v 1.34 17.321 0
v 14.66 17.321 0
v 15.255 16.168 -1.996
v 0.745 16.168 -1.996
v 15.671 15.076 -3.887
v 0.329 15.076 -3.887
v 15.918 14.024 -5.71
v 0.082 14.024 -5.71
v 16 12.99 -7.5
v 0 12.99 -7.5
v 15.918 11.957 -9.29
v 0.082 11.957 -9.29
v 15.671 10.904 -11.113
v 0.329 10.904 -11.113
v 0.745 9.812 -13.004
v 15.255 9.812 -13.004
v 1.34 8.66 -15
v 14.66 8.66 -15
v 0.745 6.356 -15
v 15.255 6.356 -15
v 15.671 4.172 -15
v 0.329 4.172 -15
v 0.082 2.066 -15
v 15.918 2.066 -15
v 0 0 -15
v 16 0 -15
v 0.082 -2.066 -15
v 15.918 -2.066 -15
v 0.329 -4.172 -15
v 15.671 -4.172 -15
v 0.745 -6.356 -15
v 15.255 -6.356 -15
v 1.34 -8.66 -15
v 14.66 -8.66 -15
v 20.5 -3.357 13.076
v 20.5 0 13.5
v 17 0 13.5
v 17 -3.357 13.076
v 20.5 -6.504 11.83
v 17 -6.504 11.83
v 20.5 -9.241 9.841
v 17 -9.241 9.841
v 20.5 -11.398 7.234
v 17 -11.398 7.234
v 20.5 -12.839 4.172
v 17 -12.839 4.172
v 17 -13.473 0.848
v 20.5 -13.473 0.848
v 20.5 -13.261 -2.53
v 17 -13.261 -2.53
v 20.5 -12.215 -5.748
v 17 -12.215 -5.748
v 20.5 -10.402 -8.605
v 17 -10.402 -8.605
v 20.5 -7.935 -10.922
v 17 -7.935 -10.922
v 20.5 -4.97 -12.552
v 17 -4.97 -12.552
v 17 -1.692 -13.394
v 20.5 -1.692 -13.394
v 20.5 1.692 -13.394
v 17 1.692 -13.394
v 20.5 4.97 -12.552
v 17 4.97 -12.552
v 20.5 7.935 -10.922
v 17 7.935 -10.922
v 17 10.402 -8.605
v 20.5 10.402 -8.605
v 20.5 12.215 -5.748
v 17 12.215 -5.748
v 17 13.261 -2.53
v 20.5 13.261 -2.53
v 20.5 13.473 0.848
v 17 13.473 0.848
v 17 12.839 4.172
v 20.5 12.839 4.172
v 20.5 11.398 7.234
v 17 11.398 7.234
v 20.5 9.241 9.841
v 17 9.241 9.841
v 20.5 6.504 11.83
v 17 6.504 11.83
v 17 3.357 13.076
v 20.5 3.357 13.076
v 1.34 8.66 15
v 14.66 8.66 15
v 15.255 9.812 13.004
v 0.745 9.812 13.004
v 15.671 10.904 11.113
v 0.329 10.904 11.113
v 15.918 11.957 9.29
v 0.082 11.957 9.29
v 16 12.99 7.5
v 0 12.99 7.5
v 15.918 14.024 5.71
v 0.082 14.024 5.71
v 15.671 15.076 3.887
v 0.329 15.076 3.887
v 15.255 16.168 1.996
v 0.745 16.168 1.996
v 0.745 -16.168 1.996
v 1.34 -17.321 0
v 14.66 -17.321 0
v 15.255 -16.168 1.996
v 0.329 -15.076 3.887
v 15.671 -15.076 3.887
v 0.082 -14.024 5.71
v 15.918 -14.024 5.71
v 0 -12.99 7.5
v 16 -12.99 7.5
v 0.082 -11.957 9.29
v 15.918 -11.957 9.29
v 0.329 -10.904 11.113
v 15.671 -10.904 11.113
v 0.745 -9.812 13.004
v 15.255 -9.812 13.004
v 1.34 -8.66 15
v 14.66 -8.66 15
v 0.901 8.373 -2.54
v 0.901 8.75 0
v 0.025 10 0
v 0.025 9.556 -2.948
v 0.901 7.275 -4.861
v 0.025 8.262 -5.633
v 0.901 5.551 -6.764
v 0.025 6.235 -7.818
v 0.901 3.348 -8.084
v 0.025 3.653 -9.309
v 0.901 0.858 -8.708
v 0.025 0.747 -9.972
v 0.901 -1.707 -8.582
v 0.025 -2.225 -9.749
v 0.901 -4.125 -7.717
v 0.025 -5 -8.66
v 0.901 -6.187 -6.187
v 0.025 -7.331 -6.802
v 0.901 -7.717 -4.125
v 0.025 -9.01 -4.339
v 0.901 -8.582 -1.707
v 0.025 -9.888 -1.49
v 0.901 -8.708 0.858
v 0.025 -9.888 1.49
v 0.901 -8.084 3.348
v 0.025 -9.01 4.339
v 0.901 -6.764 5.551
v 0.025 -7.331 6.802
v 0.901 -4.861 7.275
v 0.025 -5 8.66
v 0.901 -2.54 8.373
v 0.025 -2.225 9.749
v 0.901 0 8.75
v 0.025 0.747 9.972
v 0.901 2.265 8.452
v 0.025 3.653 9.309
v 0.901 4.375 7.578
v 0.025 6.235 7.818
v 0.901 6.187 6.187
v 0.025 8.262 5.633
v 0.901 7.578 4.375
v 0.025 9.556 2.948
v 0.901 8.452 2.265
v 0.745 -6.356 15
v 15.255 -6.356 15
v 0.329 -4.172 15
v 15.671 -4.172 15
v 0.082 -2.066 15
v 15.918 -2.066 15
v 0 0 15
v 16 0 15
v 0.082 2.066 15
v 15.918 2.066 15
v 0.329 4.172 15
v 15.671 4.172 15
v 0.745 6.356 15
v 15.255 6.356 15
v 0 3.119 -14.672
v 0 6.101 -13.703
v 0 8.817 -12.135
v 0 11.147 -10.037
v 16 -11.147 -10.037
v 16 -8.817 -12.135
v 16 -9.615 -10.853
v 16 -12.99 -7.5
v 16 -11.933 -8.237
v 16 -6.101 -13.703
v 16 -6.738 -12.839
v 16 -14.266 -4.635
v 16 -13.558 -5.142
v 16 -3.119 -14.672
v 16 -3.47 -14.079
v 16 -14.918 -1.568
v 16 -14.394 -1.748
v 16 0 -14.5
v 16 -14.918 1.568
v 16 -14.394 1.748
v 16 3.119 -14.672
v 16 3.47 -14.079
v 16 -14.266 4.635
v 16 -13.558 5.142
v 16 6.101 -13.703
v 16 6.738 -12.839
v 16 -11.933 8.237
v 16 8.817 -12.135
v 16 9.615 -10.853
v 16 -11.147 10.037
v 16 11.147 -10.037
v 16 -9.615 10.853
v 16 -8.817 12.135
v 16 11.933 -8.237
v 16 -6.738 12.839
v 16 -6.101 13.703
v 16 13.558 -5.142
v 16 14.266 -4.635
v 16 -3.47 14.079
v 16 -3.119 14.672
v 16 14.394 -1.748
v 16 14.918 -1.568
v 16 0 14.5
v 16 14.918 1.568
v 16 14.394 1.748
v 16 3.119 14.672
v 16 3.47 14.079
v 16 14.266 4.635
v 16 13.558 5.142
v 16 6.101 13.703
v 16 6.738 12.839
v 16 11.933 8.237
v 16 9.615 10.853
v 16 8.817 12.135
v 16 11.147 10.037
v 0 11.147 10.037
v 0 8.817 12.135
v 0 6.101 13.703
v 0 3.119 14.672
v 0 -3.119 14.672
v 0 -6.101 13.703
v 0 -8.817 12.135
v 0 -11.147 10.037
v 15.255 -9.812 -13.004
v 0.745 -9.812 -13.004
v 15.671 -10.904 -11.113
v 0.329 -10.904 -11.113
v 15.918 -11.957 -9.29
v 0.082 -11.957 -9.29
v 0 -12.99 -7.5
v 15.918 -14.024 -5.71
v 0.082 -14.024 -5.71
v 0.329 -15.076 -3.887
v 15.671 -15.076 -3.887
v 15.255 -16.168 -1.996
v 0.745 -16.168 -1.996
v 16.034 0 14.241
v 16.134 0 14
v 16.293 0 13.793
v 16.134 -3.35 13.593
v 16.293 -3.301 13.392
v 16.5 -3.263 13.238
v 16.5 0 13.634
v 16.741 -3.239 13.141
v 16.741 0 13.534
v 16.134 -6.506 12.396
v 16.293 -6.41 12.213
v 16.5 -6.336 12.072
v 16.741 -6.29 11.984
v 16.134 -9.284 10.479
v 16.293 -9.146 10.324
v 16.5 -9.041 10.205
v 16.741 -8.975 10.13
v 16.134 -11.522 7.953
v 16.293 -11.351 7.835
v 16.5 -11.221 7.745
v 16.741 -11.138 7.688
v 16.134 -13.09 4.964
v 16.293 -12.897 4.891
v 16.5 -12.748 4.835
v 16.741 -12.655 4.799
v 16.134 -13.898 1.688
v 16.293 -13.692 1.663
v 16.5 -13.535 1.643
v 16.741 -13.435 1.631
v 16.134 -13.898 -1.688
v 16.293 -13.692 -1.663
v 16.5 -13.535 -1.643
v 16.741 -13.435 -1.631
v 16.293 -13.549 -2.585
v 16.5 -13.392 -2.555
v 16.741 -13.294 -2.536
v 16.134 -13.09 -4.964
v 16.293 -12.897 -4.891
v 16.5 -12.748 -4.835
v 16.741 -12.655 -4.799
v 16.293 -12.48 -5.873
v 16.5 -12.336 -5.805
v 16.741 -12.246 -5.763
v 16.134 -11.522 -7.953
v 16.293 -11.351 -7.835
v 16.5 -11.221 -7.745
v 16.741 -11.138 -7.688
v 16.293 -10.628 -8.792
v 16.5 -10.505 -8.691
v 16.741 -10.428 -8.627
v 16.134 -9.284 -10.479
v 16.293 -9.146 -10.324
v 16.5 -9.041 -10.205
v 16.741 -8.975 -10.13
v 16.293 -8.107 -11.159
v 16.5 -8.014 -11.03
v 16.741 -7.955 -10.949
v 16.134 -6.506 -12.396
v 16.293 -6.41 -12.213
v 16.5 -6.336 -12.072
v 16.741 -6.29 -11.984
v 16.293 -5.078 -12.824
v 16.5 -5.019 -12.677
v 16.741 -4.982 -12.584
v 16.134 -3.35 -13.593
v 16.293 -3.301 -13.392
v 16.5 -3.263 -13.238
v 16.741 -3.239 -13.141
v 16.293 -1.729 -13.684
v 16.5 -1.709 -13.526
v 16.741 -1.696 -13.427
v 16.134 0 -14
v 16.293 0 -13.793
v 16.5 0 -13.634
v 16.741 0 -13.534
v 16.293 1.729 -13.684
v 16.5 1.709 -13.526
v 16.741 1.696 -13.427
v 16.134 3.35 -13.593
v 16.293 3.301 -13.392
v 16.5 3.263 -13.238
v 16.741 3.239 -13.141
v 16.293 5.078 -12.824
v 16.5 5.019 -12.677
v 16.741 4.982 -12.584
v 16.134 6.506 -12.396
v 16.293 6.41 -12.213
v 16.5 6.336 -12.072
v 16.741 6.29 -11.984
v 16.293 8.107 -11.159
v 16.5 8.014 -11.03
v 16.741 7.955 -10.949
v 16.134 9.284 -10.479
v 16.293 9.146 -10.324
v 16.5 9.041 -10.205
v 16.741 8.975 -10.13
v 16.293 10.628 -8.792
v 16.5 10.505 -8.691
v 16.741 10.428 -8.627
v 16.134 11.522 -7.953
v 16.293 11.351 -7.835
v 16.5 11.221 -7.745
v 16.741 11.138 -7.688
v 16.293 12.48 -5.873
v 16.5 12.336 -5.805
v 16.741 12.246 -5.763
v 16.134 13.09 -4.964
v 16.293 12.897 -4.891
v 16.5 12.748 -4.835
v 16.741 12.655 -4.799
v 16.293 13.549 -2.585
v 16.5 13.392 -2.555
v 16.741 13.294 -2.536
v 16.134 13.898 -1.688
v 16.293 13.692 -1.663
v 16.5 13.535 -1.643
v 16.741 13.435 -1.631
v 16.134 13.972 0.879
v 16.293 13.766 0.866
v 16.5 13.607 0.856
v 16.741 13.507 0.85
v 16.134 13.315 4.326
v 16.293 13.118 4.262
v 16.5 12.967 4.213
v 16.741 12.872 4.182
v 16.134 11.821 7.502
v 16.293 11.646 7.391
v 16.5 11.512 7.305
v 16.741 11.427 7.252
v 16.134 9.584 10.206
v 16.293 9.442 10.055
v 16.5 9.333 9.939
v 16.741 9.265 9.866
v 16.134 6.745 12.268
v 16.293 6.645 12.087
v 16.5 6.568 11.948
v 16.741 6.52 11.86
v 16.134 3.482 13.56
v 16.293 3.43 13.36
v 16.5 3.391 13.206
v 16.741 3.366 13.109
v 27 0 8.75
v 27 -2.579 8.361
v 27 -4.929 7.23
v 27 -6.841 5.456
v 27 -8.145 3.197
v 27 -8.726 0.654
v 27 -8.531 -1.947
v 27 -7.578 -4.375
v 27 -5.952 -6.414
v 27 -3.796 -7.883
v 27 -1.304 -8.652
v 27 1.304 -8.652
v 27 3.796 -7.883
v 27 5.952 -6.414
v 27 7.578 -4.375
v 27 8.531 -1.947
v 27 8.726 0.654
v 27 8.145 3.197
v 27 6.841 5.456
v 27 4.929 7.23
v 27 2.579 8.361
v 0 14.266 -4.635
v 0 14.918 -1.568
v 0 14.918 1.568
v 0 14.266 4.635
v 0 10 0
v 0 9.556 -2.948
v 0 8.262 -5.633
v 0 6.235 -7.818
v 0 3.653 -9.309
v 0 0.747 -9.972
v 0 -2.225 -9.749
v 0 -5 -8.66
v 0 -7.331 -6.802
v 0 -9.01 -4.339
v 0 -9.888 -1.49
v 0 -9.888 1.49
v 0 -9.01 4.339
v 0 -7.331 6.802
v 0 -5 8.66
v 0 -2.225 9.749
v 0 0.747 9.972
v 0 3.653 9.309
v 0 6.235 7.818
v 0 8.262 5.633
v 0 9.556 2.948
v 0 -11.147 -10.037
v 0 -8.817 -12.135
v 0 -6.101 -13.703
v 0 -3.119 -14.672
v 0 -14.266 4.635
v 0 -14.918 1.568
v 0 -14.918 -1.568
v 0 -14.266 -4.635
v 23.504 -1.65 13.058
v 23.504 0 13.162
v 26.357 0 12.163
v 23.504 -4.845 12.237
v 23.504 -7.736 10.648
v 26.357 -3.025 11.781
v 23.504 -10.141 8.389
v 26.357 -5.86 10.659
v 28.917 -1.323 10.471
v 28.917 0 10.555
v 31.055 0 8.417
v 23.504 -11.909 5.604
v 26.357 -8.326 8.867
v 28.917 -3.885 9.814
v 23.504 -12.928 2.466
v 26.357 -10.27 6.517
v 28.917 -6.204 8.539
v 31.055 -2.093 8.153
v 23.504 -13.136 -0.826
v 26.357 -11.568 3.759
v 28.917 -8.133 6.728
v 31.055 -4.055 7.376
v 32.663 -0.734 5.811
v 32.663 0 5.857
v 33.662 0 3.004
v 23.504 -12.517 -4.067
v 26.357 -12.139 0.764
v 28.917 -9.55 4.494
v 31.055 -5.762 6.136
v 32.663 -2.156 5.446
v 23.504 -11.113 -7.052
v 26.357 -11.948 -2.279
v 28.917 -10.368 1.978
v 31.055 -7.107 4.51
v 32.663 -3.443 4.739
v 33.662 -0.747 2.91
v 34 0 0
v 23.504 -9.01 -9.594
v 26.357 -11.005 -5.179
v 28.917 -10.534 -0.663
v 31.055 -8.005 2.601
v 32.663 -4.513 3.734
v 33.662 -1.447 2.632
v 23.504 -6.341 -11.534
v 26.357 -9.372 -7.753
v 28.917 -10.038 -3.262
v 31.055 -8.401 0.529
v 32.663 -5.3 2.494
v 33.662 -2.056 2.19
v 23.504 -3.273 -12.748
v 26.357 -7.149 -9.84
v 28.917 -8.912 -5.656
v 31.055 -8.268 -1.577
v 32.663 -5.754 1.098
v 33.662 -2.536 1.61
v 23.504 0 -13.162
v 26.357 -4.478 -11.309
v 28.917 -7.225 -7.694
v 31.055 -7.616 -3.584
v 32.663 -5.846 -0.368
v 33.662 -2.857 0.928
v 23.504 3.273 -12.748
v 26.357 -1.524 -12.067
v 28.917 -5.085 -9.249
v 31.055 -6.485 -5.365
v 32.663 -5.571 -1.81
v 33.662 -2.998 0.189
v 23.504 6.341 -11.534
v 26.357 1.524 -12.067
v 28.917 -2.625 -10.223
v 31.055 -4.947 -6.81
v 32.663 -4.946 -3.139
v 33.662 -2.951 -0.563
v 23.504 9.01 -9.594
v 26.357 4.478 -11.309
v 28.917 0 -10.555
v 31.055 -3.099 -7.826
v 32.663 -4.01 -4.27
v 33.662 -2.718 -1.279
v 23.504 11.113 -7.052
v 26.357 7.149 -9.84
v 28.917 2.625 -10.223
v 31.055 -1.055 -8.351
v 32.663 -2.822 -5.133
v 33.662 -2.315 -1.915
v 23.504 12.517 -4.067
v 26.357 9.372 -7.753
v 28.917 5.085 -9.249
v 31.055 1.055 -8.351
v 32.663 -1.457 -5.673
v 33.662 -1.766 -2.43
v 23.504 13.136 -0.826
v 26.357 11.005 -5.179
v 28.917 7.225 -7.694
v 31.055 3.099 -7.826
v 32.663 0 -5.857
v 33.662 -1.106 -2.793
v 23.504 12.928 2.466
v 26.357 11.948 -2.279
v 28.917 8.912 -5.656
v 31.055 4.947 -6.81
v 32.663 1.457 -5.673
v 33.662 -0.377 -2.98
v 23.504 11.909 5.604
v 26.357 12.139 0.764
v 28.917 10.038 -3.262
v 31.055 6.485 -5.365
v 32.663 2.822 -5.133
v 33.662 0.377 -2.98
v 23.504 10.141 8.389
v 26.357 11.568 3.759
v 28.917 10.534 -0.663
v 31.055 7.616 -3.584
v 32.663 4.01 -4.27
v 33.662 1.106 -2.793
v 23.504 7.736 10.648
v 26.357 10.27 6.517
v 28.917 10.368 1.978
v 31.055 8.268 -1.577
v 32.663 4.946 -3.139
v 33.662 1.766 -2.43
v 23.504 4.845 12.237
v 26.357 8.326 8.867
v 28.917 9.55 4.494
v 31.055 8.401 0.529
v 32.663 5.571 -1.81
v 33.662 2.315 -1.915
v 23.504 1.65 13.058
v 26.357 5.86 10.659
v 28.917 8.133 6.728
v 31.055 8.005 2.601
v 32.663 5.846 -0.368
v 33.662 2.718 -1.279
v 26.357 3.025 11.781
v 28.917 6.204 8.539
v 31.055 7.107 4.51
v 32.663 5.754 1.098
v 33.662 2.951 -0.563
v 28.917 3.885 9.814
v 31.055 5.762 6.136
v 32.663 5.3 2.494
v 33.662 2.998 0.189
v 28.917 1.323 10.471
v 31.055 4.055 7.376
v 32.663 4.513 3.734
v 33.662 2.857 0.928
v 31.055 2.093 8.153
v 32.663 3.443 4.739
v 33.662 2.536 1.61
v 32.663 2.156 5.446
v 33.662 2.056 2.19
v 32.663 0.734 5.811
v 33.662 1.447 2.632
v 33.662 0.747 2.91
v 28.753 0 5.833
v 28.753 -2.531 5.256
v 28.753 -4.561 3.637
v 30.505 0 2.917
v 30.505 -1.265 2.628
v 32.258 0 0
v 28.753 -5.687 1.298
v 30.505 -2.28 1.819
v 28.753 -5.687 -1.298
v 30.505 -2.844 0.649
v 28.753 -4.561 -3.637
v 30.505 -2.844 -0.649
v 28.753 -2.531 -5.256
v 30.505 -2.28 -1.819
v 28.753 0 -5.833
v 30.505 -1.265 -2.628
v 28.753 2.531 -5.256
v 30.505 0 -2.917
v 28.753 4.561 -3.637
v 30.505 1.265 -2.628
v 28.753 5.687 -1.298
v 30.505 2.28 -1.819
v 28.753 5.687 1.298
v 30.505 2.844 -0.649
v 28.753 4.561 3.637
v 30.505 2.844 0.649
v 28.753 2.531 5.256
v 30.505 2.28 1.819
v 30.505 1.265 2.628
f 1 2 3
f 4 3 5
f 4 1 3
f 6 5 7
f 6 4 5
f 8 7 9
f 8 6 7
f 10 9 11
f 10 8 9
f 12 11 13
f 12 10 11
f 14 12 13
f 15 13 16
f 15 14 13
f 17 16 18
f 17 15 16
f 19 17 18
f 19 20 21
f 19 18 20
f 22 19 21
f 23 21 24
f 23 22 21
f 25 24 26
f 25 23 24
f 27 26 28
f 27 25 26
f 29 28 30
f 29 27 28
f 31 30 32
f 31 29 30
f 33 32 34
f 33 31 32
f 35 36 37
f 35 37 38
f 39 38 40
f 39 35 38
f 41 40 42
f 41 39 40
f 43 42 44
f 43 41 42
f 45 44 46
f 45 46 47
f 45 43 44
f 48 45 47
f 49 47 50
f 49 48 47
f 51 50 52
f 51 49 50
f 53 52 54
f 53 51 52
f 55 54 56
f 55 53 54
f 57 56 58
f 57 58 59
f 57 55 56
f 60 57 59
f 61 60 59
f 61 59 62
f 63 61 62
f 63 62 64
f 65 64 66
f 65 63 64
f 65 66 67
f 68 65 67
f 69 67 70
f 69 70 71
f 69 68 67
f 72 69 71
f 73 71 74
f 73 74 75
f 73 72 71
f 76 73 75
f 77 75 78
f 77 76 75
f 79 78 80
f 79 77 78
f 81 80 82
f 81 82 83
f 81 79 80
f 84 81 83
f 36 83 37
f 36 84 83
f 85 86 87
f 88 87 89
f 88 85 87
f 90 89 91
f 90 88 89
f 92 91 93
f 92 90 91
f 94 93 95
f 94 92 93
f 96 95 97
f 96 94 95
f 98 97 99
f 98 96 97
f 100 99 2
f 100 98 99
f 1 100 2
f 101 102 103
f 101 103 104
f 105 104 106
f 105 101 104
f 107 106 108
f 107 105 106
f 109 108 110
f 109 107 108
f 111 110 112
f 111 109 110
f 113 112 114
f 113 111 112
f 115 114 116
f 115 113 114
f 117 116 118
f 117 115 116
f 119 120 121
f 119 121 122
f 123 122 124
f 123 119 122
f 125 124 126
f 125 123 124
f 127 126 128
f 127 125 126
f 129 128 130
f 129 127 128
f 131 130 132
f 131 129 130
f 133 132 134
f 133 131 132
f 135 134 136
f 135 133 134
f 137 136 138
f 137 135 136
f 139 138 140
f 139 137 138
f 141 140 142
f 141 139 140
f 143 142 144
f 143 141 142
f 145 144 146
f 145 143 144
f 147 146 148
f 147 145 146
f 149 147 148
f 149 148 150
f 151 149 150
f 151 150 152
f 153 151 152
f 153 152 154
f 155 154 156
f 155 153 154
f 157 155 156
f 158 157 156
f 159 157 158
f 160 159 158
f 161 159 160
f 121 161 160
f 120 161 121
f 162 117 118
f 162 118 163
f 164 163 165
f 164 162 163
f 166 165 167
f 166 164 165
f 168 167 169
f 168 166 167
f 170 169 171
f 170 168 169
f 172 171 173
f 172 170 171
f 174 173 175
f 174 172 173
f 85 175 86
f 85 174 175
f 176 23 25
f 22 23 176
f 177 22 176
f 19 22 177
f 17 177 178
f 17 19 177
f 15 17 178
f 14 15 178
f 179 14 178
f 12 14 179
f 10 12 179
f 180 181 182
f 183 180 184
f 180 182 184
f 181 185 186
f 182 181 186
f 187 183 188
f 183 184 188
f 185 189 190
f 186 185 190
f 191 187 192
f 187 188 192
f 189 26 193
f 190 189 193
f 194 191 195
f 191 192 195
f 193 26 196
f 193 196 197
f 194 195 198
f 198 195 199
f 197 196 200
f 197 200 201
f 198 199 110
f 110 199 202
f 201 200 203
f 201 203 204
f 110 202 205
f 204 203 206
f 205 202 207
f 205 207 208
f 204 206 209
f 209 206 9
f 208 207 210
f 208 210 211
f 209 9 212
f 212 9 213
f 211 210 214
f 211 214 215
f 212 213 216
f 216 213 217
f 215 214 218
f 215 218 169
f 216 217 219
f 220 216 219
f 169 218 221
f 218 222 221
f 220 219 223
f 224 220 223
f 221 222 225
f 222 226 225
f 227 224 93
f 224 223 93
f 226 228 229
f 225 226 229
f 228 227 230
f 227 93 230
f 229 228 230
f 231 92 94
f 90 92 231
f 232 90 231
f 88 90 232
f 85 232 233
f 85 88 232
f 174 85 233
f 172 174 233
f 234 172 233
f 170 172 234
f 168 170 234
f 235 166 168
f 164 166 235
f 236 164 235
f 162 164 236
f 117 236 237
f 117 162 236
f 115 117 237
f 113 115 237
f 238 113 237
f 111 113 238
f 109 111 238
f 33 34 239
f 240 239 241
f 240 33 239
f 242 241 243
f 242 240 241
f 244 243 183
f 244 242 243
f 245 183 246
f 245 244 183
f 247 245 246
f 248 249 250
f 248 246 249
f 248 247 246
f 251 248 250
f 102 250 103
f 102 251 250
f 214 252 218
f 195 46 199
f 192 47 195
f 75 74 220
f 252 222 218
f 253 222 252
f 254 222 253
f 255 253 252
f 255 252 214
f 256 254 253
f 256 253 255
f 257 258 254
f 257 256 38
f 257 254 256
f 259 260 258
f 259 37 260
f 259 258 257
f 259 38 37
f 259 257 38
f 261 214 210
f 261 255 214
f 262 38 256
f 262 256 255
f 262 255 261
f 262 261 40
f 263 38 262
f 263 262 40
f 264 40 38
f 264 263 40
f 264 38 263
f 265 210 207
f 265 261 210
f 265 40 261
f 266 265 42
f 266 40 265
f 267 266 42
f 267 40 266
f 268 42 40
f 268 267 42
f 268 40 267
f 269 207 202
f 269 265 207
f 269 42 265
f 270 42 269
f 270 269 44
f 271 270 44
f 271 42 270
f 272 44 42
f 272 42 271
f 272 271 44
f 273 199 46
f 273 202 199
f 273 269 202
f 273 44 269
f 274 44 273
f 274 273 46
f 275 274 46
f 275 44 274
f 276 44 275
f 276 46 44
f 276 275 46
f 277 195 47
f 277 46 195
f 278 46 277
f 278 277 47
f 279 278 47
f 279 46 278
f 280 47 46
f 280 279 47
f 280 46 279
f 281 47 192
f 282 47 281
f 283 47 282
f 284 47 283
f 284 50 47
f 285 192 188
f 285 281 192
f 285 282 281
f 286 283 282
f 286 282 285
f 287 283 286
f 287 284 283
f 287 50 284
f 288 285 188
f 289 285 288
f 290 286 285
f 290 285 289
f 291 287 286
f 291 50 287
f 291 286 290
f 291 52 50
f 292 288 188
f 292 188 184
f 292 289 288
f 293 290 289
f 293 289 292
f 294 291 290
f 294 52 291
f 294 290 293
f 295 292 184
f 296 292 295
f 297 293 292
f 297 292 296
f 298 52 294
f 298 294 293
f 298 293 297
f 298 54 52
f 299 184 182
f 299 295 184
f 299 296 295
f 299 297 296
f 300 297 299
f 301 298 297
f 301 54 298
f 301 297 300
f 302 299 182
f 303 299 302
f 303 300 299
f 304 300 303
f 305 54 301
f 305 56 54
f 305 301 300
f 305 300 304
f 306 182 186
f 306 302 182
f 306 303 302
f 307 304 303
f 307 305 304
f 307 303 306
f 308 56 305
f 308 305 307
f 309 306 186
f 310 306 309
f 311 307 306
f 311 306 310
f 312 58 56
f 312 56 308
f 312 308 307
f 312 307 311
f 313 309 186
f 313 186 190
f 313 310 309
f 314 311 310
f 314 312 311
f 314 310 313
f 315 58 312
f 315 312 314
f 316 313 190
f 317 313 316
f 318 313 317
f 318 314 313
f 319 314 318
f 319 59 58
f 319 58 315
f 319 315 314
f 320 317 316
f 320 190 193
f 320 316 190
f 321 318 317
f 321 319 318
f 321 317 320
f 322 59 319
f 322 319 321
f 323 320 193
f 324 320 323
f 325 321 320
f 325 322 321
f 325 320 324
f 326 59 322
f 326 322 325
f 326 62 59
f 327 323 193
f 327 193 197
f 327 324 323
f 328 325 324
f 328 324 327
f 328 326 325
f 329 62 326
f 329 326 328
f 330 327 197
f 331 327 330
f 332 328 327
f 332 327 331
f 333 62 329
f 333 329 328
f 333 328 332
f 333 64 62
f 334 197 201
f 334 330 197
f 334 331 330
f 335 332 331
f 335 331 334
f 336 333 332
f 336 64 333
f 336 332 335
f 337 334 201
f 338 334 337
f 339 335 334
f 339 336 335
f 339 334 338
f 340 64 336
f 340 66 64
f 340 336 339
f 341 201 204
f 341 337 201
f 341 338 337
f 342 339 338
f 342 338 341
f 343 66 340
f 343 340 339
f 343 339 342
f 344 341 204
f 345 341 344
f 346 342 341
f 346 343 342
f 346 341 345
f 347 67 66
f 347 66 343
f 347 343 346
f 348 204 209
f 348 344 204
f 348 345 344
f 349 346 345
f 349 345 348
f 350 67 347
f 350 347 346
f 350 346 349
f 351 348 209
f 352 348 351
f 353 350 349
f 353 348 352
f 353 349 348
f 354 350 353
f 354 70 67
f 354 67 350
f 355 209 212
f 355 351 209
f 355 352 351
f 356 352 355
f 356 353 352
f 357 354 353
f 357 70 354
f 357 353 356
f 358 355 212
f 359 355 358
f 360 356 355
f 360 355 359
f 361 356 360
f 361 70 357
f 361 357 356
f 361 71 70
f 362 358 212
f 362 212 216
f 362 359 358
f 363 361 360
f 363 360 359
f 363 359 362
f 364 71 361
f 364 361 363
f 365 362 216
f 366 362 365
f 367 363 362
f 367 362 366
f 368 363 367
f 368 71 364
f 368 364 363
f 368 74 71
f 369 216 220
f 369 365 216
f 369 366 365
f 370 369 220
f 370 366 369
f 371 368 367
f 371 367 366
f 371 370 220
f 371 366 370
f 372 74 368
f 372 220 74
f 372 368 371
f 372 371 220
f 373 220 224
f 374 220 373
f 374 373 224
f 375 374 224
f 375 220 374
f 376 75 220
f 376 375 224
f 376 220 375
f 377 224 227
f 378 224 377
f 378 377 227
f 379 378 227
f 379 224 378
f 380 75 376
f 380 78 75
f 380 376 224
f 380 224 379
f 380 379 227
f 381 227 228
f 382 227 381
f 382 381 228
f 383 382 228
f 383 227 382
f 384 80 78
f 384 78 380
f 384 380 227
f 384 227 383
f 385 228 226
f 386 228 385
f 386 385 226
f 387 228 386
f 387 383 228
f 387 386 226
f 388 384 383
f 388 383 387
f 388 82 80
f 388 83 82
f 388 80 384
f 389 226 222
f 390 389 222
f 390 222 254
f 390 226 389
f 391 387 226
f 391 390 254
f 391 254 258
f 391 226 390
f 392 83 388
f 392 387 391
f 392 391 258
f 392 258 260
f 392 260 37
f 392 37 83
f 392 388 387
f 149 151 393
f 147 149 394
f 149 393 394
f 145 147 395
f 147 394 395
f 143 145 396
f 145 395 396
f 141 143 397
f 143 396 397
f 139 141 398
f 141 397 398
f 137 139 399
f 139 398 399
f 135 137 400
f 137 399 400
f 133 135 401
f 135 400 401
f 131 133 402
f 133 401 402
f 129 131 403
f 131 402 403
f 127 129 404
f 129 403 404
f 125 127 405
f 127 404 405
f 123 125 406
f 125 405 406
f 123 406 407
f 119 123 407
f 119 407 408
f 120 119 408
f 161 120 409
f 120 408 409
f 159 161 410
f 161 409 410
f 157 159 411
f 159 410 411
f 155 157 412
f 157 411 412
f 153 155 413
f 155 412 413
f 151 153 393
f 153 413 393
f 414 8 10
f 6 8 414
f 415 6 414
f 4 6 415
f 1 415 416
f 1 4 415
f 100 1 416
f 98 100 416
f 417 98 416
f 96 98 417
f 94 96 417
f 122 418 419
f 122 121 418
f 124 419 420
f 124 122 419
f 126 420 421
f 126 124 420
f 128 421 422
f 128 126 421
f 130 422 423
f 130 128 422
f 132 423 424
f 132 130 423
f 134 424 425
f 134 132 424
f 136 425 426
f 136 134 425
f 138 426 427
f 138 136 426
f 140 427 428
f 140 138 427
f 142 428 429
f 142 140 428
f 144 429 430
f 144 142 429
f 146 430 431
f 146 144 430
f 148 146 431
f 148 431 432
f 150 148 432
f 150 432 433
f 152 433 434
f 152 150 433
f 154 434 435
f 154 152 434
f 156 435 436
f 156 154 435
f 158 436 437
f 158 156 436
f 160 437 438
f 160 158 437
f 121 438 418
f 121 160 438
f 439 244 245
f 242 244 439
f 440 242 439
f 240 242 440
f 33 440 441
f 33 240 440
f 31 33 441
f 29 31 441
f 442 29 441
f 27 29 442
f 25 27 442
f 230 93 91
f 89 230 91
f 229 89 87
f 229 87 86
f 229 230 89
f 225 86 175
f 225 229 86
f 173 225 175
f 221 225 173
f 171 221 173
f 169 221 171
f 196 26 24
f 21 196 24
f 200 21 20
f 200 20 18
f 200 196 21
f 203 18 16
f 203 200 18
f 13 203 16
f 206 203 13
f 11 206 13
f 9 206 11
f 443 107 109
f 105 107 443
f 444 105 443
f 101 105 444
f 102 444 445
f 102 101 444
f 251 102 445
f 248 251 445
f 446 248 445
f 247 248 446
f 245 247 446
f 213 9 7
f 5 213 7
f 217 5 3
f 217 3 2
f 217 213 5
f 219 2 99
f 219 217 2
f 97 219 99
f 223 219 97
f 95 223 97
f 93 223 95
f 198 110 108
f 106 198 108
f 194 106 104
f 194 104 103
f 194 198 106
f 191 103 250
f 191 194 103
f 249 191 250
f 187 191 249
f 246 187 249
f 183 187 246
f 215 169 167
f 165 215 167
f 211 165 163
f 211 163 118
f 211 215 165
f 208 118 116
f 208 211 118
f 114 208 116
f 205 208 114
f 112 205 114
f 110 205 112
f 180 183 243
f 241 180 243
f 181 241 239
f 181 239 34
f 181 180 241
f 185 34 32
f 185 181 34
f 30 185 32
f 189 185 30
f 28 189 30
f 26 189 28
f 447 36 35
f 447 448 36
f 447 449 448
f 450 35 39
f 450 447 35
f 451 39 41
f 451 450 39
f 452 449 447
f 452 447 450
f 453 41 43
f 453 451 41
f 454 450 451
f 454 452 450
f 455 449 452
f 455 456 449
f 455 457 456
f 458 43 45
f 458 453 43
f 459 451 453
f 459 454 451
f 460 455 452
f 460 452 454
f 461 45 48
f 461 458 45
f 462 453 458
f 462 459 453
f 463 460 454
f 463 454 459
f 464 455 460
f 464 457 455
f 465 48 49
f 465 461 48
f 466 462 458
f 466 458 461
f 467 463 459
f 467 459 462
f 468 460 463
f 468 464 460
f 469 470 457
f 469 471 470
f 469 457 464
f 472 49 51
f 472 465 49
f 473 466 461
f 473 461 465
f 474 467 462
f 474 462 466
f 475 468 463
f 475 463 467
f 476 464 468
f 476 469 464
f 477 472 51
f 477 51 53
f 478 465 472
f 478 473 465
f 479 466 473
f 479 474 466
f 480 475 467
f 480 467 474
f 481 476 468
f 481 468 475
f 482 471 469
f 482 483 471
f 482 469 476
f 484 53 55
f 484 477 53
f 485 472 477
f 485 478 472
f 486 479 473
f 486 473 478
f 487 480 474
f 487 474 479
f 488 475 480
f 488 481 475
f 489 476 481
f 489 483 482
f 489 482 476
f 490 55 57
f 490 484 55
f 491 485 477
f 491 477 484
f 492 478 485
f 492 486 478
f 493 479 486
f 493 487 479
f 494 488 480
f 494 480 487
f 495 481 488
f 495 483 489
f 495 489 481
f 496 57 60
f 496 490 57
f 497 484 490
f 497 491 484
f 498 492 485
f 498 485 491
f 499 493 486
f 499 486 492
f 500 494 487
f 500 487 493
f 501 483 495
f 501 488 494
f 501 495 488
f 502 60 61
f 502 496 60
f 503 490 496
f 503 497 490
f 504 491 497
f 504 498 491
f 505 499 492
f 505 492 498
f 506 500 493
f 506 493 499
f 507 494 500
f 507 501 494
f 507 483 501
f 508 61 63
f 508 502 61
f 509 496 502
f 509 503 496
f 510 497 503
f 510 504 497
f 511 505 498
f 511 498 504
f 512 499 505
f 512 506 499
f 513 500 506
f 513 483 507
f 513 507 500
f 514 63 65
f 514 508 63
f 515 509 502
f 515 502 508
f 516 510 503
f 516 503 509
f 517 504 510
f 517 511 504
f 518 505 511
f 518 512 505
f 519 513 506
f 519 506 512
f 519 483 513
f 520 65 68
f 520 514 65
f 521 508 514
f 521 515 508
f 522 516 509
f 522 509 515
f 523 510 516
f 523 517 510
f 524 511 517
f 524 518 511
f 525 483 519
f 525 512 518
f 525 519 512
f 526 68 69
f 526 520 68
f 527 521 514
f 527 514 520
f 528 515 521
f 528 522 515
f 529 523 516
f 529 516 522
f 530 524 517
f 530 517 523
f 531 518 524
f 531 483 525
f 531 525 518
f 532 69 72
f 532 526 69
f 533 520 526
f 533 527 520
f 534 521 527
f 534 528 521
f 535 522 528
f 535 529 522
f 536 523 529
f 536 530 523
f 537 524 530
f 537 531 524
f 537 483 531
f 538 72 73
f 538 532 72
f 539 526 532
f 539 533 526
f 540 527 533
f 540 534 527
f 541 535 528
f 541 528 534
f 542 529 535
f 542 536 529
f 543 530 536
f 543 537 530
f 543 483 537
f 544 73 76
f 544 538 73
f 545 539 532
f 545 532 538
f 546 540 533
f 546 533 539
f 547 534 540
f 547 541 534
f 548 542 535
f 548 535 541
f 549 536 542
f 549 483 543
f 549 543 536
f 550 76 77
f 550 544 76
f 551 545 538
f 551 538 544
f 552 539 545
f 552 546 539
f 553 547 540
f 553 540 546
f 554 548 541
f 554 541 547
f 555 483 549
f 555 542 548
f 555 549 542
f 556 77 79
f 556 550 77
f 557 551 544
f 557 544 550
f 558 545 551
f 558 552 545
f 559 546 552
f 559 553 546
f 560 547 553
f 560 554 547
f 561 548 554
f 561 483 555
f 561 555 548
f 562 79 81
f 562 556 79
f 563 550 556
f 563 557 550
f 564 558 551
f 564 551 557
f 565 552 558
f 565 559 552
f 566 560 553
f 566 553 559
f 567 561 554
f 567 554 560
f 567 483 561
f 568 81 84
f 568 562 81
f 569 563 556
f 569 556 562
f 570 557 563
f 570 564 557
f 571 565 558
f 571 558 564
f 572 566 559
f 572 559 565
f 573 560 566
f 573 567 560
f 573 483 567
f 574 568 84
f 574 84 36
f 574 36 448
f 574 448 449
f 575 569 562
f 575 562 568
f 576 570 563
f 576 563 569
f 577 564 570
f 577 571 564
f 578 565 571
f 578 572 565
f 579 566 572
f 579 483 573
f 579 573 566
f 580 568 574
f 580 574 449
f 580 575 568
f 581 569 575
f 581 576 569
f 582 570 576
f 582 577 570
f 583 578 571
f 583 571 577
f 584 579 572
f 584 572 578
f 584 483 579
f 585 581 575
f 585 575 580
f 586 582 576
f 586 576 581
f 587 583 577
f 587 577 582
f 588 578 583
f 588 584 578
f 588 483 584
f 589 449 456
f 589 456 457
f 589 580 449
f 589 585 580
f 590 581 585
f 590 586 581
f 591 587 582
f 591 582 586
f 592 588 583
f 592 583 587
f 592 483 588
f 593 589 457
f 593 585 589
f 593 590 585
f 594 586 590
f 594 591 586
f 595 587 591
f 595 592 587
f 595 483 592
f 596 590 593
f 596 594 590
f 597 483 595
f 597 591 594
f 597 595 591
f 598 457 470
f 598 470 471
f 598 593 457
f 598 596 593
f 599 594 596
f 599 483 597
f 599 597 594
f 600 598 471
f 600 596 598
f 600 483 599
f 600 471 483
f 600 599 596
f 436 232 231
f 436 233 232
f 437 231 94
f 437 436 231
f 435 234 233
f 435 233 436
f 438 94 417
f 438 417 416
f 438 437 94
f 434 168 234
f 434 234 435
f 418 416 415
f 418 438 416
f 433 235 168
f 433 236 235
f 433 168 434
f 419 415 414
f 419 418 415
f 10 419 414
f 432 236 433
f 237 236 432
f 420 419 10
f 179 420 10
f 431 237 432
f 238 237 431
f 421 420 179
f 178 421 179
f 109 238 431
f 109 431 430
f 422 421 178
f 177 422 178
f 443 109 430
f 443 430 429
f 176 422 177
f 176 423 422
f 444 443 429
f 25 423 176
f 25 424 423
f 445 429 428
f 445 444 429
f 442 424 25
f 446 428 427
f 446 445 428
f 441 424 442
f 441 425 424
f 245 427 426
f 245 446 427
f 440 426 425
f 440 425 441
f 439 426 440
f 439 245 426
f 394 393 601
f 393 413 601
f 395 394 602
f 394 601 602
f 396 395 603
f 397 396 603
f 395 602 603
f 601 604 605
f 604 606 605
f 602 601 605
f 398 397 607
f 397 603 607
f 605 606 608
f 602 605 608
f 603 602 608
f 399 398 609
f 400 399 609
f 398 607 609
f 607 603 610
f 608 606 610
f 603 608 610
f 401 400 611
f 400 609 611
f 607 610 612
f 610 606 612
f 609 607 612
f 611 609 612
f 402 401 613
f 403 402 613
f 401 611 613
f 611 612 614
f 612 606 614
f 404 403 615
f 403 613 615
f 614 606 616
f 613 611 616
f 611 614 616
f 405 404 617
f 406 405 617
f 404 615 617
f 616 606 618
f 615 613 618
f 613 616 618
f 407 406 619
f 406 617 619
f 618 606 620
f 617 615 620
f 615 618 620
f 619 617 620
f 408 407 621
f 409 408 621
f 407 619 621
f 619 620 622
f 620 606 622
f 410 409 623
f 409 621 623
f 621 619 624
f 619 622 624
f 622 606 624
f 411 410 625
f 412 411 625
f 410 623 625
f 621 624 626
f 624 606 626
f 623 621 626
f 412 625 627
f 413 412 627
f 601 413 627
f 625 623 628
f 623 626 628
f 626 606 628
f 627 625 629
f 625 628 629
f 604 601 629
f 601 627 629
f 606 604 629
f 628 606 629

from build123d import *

# Parameters (mm, degrees)
BASENUT_DEPTH = 16
DOMEFILLET_R  = 1


with BuildPart() as part:
    # BaseNutSke → BaseNut (new body)
    with BuildSketch(Plane(origin=(0, 0, 0), x_dir=(0, 0, -1), z_dir=(1, 0, 0))):
        Polygon((15, 8.660254038), (15, -8.660254038), (0, -17.320508076), (-15, -8.660254038), (-15, 8.660254038), (0, 17.320508076), align=None)
    extrude(amount=BASENUT_DEPTH)

    # DomeSke → Dome (revolve)
    with BuildSketch(Plane.XY, mode=Mode.PRIVATE) as dome_sk:
        with BuildLine():
            Line((34, 0), (0, 0))
            Line((0, 0), (0, 13.5))
            Line((0, 13.5), (20.5, 13.5))
            ThreePointArc((20.5, 13.5), (30.045941546, 9.545941546), (34, 0))
        make_face()
    revolve(dome_sk.sketch.rotate(Axis((0, 0, 0), (1, 0, 0)), 90), axis=Axis((0, 0, 0), (1, 0, 0)))

    # Sketch4 → DoubleChamfer (revolve, cut)
    with BuildSketch(Plane.XY):
        Polygon((0, 15), (2.783121635, 19.820508076), (13.216878365, 19.820508076), (16, 15), (18, 15), (18, 30), (-2, 30), (-2, 15), align=None)
    revolve(axis=Axis((0, 0, 0), (1, 0, 0)), mode=Mode.SUBTRACT)

    # TapDriSke → TapDrill (revolve, cut)
    with BuildSketch(Plane.XY, mode=Mode.PRIVATE) as tapdrill_sk:
        Polygon((0, 8.75), (27, 8.75), (32.257530416, 0), (0, 0), align=None)
    revolve(tapdrill_sk.sketch.rotate(Axis((0, 0, 0), (1, 0, 0)), 90), axis=Axis((0, 0, 0), (1, 0, 0)), mode=Mode.SUBTRACT)

    # EndChamferSketch → EndChamfer (revolve, cut)
    with BuildSketch(Plane.XY):
        Polygon((-0.0254, 10), (0.0254, 10), (0.988185365, 8.625), (-0.0254, 8.625), align=None)
    revolve(axis=Axis((0, 0, 0), (-1, 0, 0)), mode=Mode.SUBTRACT)

    # DomeFillet
    domefillet_edges = [part.edges().sort_by_distance(p)[0] for p in [
        (16, 0, -13.5),
    ]]
    fillet(domefillet_edges, radius=DOMEFILLET_R)


solid = part.part
